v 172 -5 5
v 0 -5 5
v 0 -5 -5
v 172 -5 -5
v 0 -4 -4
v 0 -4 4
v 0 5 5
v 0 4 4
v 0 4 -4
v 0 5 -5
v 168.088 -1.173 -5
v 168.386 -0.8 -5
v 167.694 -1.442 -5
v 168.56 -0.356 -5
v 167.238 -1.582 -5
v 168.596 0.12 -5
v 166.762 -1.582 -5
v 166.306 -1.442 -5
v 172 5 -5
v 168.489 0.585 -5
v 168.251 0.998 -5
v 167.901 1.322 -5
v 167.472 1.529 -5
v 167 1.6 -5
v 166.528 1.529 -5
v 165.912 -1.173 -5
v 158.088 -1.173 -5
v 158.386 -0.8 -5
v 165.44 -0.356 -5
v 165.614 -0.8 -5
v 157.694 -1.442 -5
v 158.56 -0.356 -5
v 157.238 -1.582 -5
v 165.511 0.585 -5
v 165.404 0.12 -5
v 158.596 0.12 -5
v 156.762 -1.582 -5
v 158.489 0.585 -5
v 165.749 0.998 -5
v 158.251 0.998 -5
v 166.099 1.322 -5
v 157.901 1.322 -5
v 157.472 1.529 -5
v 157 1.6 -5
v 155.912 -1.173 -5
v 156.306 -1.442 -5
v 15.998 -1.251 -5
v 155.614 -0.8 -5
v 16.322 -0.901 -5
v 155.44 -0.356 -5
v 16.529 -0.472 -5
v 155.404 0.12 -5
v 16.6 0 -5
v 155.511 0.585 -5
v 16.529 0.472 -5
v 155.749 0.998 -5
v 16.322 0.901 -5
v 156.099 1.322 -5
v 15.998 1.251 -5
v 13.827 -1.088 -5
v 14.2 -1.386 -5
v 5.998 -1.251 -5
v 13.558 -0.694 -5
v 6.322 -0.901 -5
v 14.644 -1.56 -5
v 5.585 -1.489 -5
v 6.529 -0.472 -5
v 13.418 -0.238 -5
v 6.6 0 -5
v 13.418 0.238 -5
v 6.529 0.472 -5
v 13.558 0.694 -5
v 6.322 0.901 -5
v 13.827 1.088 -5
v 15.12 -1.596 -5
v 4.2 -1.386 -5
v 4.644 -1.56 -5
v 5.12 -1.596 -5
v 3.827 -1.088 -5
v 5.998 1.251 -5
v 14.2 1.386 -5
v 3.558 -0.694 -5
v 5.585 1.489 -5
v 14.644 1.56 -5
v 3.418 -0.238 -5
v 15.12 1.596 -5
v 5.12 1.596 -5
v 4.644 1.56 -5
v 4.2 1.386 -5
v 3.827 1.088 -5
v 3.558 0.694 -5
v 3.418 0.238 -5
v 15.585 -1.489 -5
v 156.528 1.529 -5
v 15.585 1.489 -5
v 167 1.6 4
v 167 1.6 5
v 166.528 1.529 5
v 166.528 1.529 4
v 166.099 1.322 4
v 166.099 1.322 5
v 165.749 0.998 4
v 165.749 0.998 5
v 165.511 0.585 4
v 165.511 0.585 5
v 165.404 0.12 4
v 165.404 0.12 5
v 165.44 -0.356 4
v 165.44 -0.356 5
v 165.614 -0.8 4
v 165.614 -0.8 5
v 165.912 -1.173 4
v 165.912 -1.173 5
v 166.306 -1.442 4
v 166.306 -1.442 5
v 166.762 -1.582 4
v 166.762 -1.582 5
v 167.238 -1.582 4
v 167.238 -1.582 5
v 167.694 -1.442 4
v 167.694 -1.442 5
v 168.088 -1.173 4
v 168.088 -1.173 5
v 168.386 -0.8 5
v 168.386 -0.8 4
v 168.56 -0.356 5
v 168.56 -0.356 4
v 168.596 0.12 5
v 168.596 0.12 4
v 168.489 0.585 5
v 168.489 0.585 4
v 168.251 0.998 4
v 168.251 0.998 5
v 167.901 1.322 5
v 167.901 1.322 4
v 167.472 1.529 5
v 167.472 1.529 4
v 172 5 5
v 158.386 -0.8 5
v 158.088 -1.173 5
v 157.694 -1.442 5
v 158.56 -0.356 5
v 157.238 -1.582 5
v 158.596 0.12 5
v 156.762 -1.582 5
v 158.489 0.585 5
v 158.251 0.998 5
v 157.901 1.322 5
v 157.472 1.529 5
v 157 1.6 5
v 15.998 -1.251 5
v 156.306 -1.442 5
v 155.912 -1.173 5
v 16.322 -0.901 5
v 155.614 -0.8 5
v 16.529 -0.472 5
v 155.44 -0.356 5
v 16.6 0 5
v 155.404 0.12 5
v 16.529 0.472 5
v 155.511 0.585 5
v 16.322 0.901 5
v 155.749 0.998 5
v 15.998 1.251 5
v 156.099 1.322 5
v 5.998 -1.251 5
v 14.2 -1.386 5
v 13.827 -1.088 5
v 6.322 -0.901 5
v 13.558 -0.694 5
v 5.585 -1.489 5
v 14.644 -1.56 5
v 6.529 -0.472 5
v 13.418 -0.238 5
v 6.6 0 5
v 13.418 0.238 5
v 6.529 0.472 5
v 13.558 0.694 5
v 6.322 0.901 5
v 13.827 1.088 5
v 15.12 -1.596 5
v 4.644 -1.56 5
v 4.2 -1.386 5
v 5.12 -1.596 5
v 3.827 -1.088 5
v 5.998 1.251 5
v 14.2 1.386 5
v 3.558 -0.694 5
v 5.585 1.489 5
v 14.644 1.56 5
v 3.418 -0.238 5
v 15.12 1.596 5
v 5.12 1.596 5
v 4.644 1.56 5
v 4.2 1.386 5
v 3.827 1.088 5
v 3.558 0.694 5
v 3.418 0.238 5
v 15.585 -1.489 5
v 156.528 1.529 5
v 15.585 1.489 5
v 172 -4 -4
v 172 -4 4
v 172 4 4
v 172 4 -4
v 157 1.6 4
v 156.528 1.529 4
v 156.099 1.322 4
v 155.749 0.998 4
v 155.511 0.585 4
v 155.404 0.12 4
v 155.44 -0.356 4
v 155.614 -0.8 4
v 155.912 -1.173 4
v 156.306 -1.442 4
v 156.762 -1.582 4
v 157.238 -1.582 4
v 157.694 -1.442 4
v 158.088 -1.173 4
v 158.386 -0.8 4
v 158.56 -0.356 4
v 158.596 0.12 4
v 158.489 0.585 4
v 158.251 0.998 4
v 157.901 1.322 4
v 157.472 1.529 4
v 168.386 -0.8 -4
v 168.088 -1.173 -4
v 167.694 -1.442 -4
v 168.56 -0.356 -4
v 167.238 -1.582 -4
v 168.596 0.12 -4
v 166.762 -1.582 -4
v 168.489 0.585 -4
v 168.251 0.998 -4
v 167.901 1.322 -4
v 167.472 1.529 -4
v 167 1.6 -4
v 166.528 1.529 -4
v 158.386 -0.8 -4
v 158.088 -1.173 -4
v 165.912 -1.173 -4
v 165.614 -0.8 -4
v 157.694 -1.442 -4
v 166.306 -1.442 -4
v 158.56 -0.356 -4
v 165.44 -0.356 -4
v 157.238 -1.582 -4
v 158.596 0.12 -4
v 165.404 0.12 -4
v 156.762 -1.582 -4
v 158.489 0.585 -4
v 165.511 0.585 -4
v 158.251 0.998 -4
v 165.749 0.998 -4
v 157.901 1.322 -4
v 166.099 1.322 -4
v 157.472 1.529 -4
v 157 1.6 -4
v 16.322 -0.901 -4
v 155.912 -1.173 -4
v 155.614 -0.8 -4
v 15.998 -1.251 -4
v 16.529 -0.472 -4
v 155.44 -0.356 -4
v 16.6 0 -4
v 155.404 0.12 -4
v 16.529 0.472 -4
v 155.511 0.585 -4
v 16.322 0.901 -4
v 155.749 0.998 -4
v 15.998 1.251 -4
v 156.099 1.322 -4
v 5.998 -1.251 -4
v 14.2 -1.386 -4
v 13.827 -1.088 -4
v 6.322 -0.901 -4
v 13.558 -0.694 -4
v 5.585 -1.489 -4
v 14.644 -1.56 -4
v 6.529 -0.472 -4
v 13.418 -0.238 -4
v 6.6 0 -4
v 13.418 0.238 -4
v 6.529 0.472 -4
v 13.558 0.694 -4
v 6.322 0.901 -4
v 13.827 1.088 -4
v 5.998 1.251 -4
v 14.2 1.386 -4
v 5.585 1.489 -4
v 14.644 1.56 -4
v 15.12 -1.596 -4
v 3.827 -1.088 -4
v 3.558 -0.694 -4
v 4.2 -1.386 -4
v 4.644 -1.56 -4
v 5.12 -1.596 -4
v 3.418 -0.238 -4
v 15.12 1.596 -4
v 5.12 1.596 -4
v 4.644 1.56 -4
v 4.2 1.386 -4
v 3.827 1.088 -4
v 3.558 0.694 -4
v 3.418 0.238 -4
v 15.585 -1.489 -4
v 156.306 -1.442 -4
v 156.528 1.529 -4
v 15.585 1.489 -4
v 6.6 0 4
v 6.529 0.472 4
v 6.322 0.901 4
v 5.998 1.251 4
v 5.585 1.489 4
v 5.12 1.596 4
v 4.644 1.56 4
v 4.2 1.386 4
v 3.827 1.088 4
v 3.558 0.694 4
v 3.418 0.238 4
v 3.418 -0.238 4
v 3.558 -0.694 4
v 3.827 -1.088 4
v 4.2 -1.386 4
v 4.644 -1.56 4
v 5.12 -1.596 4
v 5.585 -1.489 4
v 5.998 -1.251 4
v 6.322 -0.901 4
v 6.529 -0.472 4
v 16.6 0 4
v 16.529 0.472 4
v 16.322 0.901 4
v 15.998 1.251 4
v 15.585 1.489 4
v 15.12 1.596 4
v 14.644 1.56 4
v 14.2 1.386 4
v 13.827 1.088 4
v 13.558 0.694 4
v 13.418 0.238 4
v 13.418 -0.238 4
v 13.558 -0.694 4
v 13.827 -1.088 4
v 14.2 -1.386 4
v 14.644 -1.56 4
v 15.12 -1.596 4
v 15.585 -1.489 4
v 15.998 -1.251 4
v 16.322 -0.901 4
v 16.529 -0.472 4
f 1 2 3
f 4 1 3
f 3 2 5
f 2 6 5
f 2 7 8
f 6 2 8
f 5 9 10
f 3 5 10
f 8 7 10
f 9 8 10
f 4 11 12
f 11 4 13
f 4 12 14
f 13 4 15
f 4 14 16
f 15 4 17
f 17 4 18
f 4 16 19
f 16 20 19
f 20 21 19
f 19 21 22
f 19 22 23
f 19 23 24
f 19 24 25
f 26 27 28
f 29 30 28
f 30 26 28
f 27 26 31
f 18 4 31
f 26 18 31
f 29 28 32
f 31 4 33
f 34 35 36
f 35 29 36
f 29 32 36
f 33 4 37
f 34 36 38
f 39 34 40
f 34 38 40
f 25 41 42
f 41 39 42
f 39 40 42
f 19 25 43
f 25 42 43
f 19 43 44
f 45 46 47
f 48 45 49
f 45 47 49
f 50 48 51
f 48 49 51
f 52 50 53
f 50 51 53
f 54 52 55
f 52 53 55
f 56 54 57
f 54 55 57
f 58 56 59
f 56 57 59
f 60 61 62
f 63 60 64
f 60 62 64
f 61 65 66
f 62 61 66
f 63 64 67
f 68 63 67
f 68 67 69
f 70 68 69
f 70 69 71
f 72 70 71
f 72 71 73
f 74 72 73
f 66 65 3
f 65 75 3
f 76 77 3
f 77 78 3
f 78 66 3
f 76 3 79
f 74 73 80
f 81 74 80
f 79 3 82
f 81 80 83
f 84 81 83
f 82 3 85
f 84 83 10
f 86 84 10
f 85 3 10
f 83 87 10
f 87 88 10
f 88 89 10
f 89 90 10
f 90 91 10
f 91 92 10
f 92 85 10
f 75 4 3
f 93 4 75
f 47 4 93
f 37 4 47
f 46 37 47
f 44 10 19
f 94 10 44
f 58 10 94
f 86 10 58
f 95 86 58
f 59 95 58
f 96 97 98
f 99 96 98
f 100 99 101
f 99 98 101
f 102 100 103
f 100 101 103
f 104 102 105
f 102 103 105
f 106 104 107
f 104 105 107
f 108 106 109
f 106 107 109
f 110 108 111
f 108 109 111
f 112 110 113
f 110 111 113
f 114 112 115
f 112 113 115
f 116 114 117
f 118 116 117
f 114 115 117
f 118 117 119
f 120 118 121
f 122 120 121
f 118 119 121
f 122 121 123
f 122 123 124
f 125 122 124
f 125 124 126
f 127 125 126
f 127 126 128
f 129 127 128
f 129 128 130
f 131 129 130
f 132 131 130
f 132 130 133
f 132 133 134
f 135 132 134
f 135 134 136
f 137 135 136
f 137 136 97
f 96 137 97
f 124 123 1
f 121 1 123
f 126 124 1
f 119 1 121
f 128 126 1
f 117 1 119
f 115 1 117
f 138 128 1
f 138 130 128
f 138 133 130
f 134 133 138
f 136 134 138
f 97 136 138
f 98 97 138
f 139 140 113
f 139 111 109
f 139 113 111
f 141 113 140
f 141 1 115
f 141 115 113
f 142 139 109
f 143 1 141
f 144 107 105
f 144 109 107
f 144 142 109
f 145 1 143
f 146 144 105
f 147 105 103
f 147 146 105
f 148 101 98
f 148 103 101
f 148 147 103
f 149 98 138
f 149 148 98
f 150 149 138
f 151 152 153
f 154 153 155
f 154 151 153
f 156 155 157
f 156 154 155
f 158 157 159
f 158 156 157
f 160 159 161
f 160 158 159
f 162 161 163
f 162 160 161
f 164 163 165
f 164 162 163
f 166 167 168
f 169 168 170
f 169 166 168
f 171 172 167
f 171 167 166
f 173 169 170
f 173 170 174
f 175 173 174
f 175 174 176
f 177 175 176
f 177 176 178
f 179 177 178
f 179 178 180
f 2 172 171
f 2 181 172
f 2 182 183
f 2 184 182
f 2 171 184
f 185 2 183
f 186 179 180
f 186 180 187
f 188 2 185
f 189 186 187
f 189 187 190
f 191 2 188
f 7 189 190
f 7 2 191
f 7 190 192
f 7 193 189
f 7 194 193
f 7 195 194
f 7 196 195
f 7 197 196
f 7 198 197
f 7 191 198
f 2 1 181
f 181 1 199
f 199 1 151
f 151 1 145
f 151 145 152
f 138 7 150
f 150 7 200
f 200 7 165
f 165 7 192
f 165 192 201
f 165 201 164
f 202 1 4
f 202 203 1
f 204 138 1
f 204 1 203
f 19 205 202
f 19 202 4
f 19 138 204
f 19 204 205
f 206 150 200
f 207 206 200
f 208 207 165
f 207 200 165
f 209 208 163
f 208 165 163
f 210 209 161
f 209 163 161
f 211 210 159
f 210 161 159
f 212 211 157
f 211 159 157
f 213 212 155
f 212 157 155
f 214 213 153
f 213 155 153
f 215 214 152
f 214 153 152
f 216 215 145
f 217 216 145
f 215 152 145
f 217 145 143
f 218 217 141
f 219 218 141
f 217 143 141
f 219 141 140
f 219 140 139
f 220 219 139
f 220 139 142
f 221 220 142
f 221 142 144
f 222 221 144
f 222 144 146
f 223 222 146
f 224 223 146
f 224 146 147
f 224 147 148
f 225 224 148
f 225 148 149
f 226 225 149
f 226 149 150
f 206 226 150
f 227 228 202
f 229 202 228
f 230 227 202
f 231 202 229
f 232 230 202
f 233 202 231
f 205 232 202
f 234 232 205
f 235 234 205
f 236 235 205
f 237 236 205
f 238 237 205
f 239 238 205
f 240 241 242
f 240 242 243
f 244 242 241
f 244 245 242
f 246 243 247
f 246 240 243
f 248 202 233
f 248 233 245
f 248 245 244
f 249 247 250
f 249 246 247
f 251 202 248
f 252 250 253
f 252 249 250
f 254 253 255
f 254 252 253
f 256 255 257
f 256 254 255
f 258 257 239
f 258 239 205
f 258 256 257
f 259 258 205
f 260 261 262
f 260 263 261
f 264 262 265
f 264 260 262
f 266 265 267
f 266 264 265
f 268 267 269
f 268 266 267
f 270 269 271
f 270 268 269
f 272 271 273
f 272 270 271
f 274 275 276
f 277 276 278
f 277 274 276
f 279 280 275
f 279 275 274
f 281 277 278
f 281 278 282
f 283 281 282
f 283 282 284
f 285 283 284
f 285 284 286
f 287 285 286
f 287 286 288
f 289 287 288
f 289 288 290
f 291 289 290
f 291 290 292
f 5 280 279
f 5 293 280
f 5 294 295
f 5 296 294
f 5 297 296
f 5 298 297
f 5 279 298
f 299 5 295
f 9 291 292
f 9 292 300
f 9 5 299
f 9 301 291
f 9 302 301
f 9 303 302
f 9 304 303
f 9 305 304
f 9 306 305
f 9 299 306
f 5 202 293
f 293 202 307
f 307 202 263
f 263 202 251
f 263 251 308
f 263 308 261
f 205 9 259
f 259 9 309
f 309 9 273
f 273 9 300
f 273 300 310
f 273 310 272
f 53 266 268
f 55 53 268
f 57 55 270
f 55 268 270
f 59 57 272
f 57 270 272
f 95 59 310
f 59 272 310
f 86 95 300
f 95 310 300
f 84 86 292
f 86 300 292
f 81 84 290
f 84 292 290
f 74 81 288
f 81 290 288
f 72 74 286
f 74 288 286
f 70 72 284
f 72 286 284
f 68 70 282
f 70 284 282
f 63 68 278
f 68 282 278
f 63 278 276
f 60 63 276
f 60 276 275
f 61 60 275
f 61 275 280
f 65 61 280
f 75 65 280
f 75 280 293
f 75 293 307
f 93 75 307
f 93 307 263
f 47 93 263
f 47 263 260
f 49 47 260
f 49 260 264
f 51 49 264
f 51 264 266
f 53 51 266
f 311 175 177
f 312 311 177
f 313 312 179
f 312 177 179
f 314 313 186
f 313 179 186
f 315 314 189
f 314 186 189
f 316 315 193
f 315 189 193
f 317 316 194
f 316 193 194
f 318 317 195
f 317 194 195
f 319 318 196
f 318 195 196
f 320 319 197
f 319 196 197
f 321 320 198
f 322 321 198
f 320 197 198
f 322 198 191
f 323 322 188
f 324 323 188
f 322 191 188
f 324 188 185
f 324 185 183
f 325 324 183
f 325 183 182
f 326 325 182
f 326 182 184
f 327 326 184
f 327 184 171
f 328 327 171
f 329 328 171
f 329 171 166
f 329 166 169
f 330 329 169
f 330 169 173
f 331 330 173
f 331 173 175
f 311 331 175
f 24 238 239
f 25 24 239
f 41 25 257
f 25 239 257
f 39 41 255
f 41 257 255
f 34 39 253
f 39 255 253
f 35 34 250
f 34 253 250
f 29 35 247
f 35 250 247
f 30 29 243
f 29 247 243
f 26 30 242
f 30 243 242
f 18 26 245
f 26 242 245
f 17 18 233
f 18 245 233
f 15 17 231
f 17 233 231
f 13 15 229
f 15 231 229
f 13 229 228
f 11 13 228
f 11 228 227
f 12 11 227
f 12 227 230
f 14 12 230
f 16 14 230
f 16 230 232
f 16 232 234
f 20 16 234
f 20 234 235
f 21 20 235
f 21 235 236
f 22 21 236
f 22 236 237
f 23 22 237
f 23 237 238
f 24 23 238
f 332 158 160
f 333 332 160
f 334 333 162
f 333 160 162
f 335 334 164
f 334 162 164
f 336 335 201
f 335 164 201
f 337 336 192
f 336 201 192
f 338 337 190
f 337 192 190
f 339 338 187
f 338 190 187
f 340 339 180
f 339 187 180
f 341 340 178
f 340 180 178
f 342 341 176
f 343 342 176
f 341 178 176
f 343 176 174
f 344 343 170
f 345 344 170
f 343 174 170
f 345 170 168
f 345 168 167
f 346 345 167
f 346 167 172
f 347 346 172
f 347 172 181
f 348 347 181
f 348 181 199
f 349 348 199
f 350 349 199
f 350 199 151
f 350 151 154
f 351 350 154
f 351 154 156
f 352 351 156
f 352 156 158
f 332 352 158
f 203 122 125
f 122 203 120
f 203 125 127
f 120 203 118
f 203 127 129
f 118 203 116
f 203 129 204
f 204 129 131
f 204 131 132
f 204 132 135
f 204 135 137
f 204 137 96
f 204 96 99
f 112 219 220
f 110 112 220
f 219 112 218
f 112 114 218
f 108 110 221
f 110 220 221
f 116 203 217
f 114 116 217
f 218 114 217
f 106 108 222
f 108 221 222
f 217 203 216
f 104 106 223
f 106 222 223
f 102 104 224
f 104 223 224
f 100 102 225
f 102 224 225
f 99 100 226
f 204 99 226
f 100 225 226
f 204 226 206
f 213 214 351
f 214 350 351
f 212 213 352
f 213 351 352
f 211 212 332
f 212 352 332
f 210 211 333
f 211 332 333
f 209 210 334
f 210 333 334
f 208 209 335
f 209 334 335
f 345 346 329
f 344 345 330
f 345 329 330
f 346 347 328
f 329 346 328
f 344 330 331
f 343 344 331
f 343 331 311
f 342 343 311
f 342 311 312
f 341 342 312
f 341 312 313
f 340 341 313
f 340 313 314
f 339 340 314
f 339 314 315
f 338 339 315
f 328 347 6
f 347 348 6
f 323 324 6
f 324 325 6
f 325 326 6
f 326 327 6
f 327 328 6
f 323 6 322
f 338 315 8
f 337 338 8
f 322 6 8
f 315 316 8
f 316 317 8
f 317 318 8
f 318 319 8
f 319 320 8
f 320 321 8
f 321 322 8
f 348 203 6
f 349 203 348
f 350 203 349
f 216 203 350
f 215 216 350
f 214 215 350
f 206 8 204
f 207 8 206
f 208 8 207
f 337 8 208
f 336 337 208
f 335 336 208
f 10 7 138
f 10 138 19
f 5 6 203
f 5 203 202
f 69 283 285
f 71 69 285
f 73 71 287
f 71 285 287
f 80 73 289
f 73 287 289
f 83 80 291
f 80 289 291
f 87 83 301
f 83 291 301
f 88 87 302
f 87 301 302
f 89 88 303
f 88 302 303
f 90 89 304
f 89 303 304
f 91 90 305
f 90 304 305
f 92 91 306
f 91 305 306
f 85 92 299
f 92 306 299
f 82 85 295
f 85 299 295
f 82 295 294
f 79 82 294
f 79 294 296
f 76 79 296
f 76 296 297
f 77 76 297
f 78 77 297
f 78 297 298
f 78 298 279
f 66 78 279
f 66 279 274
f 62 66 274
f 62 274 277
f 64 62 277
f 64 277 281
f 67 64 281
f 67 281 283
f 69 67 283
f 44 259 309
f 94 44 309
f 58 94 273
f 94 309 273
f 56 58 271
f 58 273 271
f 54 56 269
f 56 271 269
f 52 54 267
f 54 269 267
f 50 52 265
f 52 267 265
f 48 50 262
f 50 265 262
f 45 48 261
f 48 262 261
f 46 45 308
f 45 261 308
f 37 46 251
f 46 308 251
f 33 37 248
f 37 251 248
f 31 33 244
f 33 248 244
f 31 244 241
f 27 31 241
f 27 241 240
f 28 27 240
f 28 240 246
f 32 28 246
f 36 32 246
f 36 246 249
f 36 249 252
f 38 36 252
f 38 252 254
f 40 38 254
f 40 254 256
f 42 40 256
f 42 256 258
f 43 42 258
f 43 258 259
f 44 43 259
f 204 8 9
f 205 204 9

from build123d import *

# Parameters (mm, degrees)
SKETCH_1_W          = 10
SKETCH_1_H          = 10
SKETCH_1_W_2        = 8
SKETCH_1_H_2        = 8
EXTRUDE_1_DEPTH     = 172
SKETCH_2_R          = 1.6
CUT_EXTRUDE_1_DEPTH = 173.362989067


with BuildPart() as part:
    # ｽｹｯﾁ1 → 押し出し-薄板1 (new body)
    with BuildSketch(Plane(origin=(0, 0, 0), x_dir=(0, 0, -1), z_dir=(1, 0, 0))):
        Rectangle(SKETCH_1_W, SKETCH_1_H)
        Rectangle(SKETCH_1_W_2, SKETCH_1_H_2, mode=Mode.SUBTRACT)
    extrude(amount=EXTRUDE_1_DEPTH)

    # ｽｹｯﾁ2 → ｶｯﾄ - 押し出し1 (cut, through all)
    with BuildSketch(Plane.XY.offset(5)):
        with Locations((15, 0)):
            Circle(SKETCH_2_R)
        with Locations((5, 0)):
            Circle(SKETCH_2_R)
        with Locations(Location((167, 0, 0), (0, 0, 90))):
            Circle(SKETCH_2_R)
        with Locations(Location((157, 0, 0), (0, 0, 90))):
            Circle(SKETCH_2_R)
    extrude(amount=-CUT_EXTRUDE_1_DEPTH, mode=Mode.SUBTRACT)


solid = part.part
